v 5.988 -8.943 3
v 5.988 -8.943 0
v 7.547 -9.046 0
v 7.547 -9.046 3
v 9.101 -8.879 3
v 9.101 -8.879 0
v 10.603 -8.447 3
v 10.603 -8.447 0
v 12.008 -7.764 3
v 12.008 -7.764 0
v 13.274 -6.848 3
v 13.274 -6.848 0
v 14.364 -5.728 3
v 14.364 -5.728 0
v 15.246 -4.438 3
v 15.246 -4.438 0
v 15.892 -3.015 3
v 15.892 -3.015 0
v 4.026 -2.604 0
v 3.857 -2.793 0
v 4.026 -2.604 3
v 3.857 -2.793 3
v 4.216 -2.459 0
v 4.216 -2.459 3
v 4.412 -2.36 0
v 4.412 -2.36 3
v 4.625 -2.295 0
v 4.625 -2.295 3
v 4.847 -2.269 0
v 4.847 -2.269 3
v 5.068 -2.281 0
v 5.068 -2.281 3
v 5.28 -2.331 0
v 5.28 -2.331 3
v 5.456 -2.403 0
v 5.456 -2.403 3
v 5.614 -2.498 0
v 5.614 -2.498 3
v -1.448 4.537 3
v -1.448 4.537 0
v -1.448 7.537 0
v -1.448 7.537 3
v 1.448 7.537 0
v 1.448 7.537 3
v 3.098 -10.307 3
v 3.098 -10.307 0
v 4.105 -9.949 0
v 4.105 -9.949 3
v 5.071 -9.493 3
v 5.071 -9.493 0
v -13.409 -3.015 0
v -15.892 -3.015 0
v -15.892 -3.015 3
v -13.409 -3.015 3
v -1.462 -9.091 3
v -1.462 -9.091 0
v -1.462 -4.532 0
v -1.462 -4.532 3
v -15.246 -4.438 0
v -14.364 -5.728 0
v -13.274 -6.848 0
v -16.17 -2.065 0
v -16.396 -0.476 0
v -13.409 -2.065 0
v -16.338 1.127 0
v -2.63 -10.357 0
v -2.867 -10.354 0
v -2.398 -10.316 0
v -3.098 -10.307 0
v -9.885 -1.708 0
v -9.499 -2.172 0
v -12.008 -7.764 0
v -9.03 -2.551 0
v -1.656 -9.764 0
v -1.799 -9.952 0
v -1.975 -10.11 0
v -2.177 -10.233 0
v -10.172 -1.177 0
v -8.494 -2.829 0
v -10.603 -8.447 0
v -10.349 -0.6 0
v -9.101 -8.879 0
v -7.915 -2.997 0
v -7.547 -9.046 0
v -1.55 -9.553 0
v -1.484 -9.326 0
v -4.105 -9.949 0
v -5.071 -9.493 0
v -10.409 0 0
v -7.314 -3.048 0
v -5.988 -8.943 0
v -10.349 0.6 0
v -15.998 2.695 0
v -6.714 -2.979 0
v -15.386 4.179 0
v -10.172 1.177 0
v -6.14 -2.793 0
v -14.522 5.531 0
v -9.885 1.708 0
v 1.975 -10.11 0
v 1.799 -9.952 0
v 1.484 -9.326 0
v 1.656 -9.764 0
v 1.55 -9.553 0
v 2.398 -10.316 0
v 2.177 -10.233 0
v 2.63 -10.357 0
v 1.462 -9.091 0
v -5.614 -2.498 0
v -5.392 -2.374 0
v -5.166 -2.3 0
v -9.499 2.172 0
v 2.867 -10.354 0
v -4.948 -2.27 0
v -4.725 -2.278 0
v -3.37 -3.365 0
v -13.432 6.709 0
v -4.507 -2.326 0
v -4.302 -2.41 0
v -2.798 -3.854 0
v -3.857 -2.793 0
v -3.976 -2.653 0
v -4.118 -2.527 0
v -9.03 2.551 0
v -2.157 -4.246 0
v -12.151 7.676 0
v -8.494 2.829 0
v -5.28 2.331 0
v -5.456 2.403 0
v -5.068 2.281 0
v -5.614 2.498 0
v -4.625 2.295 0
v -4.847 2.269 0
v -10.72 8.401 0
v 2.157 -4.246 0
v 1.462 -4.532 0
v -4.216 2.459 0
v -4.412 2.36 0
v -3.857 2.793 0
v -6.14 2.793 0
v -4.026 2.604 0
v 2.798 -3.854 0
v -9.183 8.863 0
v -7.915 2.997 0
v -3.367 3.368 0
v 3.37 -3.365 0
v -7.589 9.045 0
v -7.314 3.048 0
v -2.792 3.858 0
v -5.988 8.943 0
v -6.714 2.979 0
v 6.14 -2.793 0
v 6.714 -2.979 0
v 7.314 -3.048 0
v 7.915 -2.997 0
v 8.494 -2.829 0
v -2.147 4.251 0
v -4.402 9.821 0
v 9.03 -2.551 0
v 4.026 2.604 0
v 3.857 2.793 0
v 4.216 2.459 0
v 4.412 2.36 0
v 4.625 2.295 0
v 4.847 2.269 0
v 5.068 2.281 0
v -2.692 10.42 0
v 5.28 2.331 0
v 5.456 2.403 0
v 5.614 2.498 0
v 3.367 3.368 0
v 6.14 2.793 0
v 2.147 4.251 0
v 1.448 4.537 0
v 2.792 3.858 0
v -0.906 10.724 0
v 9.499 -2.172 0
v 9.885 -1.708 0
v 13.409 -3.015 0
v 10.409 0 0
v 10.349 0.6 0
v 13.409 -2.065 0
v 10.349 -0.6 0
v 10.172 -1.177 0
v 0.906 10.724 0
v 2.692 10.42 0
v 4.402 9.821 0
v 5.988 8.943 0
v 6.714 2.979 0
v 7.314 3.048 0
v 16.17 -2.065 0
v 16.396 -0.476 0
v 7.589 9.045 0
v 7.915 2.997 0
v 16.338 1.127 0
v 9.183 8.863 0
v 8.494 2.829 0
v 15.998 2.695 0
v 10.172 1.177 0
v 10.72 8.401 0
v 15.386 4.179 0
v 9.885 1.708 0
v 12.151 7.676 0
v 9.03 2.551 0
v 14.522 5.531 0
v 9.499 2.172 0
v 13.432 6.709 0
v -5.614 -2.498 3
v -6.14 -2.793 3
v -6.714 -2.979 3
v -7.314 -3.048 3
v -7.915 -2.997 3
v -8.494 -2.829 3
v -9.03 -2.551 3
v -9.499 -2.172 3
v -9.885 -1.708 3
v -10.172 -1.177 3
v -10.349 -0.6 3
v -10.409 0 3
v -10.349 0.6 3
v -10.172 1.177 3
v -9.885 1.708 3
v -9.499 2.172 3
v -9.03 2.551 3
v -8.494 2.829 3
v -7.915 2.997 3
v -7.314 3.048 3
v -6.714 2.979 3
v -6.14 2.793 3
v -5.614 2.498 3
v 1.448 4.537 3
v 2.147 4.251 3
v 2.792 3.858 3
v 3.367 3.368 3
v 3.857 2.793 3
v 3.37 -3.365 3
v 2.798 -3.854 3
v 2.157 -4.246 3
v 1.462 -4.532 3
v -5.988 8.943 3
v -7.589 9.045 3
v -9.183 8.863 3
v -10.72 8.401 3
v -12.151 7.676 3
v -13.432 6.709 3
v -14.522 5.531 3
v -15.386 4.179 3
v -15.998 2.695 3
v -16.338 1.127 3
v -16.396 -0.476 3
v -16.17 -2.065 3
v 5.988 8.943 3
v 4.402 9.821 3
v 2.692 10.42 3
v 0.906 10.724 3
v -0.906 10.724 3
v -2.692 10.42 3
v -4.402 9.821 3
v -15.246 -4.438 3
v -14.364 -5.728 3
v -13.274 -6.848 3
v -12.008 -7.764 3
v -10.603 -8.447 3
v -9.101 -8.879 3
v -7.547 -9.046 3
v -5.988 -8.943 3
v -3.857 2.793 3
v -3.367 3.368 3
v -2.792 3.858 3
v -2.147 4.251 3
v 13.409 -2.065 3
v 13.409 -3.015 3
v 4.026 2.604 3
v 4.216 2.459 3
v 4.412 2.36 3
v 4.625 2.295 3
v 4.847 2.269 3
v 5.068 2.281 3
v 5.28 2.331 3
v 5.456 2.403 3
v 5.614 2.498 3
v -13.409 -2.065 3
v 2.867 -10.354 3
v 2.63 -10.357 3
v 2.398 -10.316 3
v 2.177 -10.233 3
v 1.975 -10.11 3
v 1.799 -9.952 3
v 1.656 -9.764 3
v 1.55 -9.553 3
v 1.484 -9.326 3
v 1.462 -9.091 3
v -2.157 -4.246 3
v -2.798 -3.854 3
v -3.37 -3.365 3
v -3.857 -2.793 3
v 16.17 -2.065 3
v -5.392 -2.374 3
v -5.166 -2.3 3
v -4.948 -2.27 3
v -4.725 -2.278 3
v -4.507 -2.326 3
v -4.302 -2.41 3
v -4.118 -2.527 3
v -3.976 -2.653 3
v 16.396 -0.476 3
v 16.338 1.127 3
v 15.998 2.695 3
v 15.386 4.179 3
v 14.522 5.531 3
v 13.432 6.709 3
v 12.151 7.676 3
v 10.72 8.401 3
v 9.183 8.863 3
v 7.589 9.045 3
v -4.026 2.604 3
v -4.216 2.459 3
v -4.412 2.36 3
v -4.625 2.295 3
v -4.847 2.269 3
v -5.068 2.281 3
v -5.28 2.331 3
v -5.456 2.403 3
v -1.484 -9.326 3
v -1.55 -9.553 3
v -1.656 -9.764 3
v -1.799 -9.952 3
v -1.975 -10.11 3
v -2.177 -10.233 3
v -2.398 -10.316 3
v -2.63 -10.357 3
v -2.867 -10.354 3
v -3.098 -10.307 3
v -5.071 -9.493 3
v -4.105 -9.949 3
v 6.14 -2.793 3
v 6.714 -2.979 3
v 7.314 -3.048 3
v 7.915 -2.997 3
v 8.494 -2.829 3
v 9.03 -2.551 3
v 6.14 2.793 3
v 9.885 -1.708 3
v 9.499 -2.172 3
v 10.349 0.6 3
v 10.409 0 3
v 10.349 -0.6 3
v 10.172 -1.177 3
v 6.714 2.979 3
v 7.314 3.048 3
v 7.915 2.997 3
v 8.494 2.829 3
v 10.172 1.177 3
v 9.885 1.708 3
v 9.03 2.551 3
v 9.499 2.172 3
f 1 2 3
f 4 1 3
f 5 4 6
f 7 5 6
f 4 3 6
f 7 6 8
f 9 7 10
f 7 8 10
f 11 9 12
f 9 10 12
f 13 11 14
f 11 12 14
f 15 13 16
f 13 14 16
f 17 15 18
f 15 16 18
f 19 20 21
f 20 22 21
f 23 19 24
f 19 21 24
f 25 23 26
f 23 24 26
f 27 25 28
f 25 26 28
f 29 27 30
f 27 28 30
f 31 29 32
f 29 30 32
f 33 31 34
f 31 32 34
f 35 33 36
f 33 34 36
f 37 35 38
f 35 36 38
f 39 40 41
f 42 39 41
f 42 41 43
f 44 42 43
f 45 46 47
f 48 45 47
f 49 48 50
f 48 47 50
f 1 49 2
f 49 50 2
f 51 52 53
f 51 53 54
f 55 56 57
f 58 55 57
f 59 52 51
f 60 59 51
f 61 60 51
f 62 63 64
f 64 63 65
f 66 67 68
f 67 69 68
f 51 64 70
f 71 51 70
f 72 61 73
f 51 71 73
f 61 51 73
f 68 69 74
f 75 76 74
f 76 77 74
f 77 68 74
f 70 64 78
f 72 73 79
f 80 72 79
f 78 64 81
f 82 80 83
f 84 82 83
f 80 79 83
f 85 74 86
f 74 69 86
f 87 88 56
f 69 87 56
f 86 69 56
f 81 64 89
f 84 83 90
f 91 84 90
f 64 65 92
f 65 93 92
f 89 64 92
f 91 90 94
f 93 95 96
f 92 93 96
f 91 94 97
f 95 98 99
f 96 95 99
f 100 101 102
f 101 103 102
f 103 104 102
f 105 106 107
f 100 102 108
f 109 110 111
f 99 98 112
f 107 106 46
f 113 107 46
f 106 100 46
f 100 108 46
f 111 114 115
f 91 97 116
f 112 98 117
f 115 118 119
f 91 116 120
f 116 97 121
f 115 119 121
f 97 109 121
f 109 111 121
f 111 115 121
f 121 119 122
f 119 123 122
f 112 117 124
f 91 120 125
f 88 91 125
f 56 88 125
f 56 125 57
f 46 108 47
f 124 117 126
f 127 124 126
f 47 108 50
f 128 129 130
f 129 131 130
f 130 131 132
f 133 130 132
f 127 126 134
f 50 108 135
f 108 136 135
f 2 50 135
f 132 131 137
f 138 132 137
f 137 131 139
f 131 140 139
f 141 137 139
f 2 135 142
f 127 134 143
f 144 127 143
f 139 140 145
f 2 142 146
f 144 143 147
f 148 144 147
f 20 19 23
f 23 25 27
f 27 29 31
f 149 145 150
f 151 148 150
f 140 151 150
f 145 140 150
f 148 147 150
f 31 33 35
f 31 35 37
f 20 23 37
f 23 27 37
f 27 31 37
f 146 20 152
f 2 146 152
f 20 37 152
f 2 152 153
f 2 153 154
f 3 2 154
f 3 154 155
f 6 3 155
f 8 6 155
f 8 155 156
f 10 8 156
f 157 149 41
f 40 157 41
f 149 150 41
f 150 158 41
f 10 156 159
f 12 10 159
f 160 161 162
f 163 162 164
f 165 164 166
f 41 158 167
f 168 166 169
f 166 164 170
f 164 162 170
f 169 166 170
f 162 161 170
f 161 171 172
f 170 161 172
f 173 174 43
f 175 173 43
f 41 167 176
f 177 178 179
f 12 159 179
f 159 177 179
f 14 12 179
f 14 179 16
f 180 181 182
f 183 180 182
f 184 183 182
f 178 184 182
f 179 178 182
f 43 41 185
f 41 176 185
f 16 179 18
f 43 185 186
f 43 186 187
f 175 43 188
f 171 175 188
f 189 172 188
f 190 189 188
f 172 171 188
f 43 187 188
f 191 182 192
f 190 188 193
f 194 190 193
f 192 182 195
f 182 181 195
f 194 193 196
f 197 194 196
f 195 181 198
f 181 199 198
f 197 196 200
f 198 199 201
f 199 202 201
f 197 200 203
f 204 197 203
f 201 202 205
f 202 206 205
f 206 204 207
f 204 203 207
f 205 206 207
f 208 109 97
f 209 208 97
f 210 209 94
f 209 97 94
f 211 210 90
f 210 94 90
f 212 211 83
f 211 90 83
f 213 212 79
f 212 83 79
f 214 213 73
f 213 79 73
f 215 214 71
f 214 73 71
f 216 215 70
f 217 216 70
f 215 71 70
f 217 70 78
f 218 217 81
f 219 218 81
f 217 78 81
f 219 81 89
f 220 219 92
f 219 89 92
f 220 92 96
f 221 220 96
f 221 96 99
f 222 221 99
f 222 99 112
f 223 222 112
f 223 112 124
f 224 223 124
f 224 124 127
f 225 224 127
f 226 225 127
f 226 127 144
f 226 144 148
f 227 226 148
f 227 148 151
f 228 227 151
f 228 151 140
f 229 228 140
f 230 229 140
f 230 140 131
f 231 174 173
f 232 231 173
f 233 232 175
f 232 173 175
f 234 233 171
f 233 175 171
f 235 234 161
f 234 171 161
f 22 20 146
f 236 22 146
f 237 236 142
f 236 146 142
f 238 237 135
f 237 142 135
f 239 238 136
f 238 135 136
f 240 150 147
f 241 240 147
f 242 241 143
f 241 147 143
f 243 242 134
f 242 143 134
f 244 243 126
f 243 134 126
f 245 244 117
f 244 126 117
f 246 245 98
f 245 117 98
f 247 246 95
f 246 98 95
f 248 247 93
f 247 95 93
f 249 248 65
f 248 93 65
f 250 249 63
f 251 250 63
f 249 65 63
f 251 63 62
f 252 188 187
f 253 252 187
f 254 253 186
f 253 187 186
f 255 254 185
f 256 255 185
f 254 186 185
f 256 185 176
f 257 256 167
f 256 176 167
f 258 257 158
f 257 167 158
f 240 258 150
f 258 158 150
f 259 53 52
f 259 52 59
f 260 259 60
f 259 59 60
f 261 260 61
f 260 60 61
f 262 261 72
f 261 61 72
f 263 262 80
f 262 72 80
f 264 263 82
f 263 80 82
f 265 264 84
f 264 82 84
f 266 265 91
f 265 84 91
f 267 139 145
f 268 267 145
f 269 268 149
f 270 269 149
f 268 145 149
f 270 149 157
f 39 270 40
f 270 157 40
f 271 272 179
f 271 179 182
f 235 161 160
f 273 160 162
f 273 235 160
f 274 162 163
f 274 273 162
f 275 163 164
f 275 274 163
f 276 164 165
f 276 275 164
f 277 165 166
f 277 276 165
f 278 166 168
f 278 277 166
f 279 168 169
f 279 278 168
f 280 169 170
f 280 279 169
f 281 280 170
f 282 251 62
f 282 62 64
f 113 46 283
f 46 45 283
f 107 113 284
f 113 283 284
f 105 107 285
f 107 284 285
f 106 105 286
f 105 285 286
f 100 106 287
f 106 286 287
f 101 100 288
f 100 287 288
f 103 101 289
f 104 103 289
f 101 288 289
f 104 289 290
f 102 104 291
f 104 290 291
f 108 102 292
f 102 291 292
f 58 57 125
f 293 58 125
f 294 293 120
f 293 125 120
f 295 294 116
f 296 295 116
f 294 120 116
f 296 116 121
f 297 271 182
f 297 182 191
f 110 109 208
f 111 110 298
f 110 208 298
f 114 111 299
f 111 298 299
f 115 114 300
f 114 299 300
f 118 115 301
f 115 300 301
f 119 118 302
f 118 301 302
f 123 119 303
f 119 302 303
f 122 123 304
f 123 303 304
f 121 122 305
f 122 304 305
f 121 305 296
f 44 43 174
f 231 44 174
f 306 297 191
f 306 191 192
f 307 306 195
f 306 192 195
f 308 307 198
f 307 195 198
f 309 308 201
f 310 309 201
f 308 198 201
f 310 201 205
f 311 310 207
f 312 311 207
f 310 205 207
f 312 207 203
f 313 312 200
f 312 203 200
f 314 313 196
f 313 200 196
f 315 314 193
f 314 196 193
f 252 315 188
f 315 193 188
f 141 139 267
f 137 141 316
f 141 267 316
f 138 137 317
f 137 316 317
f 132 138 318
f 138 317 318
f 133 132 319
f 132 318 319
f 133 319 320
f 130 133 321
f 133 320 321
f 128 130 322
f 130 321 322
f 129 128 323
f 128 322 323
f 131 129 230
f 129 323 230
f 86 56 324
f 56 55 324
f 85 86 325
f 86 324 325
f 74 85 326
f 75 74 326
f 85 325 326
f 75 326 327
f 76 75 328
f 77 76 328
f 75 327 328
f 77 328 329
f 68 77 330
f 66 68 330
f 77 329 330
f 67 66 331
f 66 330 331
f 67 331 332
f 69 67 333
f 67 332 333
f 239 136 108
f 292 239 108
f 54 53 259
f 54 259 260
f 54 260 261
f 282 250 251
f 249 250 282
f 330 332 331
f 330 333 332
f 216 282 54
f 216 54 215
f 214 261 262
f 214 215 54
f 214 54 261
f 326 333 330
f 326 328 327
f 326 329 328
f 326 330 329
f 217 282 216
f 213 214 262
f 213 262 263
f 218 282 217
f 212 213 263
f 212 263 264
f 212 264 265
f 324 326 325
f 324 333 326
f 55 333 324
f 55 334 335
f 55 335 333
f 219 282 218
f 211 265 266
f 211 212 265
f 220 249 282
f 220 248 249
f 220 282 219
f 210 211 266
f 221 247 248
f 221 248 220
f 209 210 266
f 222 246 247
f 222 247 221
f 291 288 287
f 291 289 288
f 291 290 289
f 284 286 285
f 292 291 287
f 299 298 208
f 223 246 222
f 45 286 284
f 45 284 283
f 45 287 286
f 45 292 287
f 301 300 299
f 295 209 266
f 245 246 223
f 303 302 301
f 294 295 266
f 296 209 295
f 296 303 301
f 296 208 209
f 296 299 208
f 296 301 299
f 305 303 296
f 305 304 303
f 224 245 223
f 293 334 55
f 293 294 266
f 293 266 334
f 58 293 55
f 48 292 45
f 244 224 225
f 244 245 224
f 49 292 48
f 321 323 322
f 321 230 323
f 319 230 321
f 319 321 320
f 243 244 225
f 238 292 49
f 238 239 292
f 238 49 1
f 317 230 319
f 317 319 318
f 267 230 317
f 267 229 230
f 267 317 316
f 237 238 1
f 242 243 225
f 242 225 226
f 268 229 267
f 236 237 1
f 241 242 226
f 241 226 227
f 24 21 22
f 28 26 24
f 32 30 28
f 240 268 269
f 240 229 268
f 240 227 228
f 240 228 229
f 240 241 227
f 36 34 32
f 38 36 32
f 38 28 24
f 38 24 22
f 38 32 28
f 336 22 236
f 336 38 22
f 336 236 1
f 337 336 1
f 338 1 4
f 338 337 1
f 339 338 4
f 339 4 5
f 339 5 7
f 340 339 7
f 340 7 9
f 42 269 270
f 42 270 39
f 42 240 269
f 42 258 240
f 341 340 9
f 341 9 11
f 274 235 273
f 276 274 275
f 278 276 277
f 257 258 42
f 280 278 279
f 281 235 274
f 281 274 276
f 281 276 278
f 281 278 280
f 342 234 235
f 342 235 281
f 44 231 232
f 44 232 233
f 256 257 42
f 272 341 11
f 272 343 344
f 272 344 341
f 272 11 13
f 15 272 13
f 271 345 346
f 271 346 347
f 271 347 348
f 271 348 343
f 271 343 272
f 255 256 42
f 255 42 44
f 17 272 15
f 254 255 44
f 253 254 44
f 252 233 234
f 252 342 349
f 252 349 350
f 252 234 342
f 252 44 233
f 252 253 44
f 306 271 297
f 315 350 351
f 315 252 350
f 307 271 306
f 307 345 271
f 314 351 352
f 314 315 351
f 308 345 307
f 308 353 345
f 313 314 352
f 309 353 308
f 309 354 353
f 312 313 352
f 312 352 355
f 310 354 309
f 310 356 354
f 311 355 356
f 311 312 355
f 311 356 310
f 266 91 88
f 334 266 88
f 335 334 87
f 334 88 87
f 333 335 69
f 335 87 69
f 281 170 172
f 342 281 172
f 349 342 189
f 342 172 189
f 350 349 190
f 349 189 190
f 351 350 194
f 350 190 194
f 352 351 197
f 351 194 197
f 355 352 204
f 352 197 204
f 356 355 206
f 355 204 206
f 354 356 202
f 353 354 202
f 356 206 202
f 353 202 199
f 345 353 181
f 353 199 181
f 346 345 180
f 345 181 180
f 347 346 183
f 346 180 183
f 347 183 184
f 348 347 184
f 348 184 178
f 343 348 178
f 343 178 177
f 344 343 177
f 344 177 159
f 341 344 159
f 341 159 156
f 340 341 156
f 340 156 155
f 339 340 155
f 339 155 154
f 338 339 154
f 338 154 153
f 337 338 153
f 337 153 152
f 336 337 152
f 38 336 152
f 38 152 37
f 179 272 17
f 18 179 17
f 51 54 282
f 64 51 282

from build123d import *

# Parameters (mm, degrees)
EXTRUDE_1_DEPTH     = 3
SKETCH_2_W          = 3
SKETCH_2_H          = 0.95
CUT_EXTRUDE_1_DEPTH = 3
FILLET_1_R          = 1.27


with BuildPart() as part:
    # 스케치1 → 보스-돌출1 (new body)
    with BuildSketch(Plane.XY):
        with BuildLine():
            Line((-1.4475, 7.537196271), (1.4475, 7.537196271))
            Line((1.4475, 7.537196271), (1.4475, 4.537196271))
            ThreePointArc((1.4475, 4.537196271), (3.432437621, 3.301481217), (4.590044254, 1.27))
            ThreePointArc((4.590044254, 1.27), (10.408857131, 0), (4.590044254, -1.27))
            ThreePointArc((4.590044254, -1.27), (3.437893174, -3.295799869), (1.4625, -4.532383479))
            Line((1.4625, -4.532383479), (1.4625, -10.662668522))
            ThreePointArc((1.4625, -10.662668522), (3.822964303, -10.060633687), (5.987571718, -8.943175676))
            ThreePointArc((5.987571718, -8.943175676), (16.408857131, 0), (5.987571718, 8.943175676))
            ThreePointArc((5.987571718, 8.943175676), (0, 10.7625), (-5.987571718, 8.943175676))
            ThreePointArc((-5.987571718, 8.943175676), (-16.408857131, 0), (-5.987571718, -8.943175676))
            ThreePointArc((-5.987571718, -8.943175676), (-3.822964303, -10.060633687), (-1.4625, -10.662668522))
            Line((-1.4625, -10.662668522), (-1.4625, -4.532383479))
            ThreePointArc((-1.4625, -4.532383479), (-3.437893174, -3.295799869), (-4.590044254, -1.27))
            ThreePointArc((-4.590044254, -1.27), (-10.408857131, 0), (-4.590044254, 1.27))
            ThreePointArc((-4.590044254, 1.27), (-3.432437621, 3.301481217), (-1.4475, 4.537196271))
            Line((-1.4475, 4.537196271), (-1.4475, 7.537196271))
        make_face()
    extrude(amount=EXTRUDE_1_DEPTH)

    # 스케치2 → 컷-돌출1 (cut)
    with BuildSketch(Plane.XY.offset(3)):
        with Locations((14.908857131, -2.54)):
            Rectangle(SKETCH_2_W, SKETCH_2_H)
        with Locations((-14.908857131, -2.54)):
            Rectangle(SKETCH_2_W, SKETCH_2_H)
    extrude(amount=-CUT_EXTRUDE_1_DEPTH, mode=Mode.SUBTRACT)

    # 필렛1
    fillet_1_edges = [part.edges().sort_by_distance(p)[0] for p in [
        (-4.590044254, 1.27, 1.5),
        (-4.590044254, -1.27, 1.5),
        (-1.4625, -10.662668522, 1.5),
        (1.4625, -10.662668522, 1.5),
        (4.590044254, -1.27, 1.5),
        (4.590044254, 1.27, 1.5),
    ]]
    fillet(fillet_1_edges, radius=FILLET_1_R)


solid = part.part
